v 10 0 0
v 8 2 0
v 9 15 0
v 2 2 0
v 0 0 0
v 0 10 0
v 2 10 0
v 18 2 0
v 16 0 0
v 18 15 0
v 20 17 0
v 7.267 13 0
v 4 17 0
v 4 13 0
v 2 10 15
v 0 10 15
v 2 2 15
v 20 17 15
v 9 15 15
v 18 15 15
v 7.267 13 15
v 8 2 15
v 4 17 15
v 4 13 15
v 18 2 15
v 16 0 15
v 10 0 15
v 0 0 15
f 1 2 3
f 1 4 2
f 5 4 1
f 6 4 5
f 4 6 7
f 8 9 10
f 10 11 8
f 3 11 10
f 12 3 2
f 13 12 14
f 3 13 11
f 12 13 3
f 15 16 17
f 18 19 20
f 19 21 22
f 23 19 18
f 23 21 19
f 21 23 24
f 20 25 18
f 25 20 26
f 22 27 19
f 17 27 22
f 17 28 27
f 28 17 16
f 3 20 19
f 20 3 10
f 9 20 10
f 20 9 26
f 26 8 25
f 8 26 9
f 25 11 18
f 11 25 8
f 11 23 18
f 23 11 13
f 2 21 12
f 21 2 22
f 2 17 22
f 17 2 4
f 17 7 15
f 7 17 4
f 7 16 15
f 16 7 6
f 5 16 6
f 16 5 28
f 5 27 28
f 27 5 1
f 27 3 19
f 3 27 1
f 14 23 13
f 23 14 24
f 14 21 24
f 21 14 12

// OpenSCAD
// The thickness of the shell and its sides (in mm).
thickness = 2; // [2:4]

// The depth of the sides that will be on the outsides of the drawers (in mm).
sideDepth = 8; // [5:16]

// The depth of the clip (in mm).
clipDepth = 15; // [15:50]

// The size of the clip's opening (in mm).
$clipOpening = 6; // [5:30]

{}


$metal = 6;

$drawerID = $clipOpening + $metal;

$inset = 1;

// The points that make up the clips body/shape.
$clipPoints=[
    [0,0],
    [thickness + $metal + thickness, 0],
    [thickness + $metal + thickness - $inset, clipDepth],
    [thickness + $metal + thickness + ($drawerID - thickness * 2), clipDepth],
    [thickness + $metal + thickness + ($drawerID - thickness * 3), 0],

    [thickness * 2 + $metal + thickness + ($drawerID - thickness * 3), thickness],

    [thickness + $metal + $drawerID, thickness + clipDepth],
    [thickness + $metal - $inset, thickness + clipDepth],
    [thickness + $metal, thickness],
    [thickness, thickness],
    [thickness, thickness+sideDepth],

    [0, thickness+sideDepth],
];

group() {
    linear_extrude(clipDepth)
    polygon($clipPoints);
    
    // Support block
    translate([thickness*2,clipDepth-thickness,0])
    cube([$metal-2,thickness*2,clipDepth]);
}
